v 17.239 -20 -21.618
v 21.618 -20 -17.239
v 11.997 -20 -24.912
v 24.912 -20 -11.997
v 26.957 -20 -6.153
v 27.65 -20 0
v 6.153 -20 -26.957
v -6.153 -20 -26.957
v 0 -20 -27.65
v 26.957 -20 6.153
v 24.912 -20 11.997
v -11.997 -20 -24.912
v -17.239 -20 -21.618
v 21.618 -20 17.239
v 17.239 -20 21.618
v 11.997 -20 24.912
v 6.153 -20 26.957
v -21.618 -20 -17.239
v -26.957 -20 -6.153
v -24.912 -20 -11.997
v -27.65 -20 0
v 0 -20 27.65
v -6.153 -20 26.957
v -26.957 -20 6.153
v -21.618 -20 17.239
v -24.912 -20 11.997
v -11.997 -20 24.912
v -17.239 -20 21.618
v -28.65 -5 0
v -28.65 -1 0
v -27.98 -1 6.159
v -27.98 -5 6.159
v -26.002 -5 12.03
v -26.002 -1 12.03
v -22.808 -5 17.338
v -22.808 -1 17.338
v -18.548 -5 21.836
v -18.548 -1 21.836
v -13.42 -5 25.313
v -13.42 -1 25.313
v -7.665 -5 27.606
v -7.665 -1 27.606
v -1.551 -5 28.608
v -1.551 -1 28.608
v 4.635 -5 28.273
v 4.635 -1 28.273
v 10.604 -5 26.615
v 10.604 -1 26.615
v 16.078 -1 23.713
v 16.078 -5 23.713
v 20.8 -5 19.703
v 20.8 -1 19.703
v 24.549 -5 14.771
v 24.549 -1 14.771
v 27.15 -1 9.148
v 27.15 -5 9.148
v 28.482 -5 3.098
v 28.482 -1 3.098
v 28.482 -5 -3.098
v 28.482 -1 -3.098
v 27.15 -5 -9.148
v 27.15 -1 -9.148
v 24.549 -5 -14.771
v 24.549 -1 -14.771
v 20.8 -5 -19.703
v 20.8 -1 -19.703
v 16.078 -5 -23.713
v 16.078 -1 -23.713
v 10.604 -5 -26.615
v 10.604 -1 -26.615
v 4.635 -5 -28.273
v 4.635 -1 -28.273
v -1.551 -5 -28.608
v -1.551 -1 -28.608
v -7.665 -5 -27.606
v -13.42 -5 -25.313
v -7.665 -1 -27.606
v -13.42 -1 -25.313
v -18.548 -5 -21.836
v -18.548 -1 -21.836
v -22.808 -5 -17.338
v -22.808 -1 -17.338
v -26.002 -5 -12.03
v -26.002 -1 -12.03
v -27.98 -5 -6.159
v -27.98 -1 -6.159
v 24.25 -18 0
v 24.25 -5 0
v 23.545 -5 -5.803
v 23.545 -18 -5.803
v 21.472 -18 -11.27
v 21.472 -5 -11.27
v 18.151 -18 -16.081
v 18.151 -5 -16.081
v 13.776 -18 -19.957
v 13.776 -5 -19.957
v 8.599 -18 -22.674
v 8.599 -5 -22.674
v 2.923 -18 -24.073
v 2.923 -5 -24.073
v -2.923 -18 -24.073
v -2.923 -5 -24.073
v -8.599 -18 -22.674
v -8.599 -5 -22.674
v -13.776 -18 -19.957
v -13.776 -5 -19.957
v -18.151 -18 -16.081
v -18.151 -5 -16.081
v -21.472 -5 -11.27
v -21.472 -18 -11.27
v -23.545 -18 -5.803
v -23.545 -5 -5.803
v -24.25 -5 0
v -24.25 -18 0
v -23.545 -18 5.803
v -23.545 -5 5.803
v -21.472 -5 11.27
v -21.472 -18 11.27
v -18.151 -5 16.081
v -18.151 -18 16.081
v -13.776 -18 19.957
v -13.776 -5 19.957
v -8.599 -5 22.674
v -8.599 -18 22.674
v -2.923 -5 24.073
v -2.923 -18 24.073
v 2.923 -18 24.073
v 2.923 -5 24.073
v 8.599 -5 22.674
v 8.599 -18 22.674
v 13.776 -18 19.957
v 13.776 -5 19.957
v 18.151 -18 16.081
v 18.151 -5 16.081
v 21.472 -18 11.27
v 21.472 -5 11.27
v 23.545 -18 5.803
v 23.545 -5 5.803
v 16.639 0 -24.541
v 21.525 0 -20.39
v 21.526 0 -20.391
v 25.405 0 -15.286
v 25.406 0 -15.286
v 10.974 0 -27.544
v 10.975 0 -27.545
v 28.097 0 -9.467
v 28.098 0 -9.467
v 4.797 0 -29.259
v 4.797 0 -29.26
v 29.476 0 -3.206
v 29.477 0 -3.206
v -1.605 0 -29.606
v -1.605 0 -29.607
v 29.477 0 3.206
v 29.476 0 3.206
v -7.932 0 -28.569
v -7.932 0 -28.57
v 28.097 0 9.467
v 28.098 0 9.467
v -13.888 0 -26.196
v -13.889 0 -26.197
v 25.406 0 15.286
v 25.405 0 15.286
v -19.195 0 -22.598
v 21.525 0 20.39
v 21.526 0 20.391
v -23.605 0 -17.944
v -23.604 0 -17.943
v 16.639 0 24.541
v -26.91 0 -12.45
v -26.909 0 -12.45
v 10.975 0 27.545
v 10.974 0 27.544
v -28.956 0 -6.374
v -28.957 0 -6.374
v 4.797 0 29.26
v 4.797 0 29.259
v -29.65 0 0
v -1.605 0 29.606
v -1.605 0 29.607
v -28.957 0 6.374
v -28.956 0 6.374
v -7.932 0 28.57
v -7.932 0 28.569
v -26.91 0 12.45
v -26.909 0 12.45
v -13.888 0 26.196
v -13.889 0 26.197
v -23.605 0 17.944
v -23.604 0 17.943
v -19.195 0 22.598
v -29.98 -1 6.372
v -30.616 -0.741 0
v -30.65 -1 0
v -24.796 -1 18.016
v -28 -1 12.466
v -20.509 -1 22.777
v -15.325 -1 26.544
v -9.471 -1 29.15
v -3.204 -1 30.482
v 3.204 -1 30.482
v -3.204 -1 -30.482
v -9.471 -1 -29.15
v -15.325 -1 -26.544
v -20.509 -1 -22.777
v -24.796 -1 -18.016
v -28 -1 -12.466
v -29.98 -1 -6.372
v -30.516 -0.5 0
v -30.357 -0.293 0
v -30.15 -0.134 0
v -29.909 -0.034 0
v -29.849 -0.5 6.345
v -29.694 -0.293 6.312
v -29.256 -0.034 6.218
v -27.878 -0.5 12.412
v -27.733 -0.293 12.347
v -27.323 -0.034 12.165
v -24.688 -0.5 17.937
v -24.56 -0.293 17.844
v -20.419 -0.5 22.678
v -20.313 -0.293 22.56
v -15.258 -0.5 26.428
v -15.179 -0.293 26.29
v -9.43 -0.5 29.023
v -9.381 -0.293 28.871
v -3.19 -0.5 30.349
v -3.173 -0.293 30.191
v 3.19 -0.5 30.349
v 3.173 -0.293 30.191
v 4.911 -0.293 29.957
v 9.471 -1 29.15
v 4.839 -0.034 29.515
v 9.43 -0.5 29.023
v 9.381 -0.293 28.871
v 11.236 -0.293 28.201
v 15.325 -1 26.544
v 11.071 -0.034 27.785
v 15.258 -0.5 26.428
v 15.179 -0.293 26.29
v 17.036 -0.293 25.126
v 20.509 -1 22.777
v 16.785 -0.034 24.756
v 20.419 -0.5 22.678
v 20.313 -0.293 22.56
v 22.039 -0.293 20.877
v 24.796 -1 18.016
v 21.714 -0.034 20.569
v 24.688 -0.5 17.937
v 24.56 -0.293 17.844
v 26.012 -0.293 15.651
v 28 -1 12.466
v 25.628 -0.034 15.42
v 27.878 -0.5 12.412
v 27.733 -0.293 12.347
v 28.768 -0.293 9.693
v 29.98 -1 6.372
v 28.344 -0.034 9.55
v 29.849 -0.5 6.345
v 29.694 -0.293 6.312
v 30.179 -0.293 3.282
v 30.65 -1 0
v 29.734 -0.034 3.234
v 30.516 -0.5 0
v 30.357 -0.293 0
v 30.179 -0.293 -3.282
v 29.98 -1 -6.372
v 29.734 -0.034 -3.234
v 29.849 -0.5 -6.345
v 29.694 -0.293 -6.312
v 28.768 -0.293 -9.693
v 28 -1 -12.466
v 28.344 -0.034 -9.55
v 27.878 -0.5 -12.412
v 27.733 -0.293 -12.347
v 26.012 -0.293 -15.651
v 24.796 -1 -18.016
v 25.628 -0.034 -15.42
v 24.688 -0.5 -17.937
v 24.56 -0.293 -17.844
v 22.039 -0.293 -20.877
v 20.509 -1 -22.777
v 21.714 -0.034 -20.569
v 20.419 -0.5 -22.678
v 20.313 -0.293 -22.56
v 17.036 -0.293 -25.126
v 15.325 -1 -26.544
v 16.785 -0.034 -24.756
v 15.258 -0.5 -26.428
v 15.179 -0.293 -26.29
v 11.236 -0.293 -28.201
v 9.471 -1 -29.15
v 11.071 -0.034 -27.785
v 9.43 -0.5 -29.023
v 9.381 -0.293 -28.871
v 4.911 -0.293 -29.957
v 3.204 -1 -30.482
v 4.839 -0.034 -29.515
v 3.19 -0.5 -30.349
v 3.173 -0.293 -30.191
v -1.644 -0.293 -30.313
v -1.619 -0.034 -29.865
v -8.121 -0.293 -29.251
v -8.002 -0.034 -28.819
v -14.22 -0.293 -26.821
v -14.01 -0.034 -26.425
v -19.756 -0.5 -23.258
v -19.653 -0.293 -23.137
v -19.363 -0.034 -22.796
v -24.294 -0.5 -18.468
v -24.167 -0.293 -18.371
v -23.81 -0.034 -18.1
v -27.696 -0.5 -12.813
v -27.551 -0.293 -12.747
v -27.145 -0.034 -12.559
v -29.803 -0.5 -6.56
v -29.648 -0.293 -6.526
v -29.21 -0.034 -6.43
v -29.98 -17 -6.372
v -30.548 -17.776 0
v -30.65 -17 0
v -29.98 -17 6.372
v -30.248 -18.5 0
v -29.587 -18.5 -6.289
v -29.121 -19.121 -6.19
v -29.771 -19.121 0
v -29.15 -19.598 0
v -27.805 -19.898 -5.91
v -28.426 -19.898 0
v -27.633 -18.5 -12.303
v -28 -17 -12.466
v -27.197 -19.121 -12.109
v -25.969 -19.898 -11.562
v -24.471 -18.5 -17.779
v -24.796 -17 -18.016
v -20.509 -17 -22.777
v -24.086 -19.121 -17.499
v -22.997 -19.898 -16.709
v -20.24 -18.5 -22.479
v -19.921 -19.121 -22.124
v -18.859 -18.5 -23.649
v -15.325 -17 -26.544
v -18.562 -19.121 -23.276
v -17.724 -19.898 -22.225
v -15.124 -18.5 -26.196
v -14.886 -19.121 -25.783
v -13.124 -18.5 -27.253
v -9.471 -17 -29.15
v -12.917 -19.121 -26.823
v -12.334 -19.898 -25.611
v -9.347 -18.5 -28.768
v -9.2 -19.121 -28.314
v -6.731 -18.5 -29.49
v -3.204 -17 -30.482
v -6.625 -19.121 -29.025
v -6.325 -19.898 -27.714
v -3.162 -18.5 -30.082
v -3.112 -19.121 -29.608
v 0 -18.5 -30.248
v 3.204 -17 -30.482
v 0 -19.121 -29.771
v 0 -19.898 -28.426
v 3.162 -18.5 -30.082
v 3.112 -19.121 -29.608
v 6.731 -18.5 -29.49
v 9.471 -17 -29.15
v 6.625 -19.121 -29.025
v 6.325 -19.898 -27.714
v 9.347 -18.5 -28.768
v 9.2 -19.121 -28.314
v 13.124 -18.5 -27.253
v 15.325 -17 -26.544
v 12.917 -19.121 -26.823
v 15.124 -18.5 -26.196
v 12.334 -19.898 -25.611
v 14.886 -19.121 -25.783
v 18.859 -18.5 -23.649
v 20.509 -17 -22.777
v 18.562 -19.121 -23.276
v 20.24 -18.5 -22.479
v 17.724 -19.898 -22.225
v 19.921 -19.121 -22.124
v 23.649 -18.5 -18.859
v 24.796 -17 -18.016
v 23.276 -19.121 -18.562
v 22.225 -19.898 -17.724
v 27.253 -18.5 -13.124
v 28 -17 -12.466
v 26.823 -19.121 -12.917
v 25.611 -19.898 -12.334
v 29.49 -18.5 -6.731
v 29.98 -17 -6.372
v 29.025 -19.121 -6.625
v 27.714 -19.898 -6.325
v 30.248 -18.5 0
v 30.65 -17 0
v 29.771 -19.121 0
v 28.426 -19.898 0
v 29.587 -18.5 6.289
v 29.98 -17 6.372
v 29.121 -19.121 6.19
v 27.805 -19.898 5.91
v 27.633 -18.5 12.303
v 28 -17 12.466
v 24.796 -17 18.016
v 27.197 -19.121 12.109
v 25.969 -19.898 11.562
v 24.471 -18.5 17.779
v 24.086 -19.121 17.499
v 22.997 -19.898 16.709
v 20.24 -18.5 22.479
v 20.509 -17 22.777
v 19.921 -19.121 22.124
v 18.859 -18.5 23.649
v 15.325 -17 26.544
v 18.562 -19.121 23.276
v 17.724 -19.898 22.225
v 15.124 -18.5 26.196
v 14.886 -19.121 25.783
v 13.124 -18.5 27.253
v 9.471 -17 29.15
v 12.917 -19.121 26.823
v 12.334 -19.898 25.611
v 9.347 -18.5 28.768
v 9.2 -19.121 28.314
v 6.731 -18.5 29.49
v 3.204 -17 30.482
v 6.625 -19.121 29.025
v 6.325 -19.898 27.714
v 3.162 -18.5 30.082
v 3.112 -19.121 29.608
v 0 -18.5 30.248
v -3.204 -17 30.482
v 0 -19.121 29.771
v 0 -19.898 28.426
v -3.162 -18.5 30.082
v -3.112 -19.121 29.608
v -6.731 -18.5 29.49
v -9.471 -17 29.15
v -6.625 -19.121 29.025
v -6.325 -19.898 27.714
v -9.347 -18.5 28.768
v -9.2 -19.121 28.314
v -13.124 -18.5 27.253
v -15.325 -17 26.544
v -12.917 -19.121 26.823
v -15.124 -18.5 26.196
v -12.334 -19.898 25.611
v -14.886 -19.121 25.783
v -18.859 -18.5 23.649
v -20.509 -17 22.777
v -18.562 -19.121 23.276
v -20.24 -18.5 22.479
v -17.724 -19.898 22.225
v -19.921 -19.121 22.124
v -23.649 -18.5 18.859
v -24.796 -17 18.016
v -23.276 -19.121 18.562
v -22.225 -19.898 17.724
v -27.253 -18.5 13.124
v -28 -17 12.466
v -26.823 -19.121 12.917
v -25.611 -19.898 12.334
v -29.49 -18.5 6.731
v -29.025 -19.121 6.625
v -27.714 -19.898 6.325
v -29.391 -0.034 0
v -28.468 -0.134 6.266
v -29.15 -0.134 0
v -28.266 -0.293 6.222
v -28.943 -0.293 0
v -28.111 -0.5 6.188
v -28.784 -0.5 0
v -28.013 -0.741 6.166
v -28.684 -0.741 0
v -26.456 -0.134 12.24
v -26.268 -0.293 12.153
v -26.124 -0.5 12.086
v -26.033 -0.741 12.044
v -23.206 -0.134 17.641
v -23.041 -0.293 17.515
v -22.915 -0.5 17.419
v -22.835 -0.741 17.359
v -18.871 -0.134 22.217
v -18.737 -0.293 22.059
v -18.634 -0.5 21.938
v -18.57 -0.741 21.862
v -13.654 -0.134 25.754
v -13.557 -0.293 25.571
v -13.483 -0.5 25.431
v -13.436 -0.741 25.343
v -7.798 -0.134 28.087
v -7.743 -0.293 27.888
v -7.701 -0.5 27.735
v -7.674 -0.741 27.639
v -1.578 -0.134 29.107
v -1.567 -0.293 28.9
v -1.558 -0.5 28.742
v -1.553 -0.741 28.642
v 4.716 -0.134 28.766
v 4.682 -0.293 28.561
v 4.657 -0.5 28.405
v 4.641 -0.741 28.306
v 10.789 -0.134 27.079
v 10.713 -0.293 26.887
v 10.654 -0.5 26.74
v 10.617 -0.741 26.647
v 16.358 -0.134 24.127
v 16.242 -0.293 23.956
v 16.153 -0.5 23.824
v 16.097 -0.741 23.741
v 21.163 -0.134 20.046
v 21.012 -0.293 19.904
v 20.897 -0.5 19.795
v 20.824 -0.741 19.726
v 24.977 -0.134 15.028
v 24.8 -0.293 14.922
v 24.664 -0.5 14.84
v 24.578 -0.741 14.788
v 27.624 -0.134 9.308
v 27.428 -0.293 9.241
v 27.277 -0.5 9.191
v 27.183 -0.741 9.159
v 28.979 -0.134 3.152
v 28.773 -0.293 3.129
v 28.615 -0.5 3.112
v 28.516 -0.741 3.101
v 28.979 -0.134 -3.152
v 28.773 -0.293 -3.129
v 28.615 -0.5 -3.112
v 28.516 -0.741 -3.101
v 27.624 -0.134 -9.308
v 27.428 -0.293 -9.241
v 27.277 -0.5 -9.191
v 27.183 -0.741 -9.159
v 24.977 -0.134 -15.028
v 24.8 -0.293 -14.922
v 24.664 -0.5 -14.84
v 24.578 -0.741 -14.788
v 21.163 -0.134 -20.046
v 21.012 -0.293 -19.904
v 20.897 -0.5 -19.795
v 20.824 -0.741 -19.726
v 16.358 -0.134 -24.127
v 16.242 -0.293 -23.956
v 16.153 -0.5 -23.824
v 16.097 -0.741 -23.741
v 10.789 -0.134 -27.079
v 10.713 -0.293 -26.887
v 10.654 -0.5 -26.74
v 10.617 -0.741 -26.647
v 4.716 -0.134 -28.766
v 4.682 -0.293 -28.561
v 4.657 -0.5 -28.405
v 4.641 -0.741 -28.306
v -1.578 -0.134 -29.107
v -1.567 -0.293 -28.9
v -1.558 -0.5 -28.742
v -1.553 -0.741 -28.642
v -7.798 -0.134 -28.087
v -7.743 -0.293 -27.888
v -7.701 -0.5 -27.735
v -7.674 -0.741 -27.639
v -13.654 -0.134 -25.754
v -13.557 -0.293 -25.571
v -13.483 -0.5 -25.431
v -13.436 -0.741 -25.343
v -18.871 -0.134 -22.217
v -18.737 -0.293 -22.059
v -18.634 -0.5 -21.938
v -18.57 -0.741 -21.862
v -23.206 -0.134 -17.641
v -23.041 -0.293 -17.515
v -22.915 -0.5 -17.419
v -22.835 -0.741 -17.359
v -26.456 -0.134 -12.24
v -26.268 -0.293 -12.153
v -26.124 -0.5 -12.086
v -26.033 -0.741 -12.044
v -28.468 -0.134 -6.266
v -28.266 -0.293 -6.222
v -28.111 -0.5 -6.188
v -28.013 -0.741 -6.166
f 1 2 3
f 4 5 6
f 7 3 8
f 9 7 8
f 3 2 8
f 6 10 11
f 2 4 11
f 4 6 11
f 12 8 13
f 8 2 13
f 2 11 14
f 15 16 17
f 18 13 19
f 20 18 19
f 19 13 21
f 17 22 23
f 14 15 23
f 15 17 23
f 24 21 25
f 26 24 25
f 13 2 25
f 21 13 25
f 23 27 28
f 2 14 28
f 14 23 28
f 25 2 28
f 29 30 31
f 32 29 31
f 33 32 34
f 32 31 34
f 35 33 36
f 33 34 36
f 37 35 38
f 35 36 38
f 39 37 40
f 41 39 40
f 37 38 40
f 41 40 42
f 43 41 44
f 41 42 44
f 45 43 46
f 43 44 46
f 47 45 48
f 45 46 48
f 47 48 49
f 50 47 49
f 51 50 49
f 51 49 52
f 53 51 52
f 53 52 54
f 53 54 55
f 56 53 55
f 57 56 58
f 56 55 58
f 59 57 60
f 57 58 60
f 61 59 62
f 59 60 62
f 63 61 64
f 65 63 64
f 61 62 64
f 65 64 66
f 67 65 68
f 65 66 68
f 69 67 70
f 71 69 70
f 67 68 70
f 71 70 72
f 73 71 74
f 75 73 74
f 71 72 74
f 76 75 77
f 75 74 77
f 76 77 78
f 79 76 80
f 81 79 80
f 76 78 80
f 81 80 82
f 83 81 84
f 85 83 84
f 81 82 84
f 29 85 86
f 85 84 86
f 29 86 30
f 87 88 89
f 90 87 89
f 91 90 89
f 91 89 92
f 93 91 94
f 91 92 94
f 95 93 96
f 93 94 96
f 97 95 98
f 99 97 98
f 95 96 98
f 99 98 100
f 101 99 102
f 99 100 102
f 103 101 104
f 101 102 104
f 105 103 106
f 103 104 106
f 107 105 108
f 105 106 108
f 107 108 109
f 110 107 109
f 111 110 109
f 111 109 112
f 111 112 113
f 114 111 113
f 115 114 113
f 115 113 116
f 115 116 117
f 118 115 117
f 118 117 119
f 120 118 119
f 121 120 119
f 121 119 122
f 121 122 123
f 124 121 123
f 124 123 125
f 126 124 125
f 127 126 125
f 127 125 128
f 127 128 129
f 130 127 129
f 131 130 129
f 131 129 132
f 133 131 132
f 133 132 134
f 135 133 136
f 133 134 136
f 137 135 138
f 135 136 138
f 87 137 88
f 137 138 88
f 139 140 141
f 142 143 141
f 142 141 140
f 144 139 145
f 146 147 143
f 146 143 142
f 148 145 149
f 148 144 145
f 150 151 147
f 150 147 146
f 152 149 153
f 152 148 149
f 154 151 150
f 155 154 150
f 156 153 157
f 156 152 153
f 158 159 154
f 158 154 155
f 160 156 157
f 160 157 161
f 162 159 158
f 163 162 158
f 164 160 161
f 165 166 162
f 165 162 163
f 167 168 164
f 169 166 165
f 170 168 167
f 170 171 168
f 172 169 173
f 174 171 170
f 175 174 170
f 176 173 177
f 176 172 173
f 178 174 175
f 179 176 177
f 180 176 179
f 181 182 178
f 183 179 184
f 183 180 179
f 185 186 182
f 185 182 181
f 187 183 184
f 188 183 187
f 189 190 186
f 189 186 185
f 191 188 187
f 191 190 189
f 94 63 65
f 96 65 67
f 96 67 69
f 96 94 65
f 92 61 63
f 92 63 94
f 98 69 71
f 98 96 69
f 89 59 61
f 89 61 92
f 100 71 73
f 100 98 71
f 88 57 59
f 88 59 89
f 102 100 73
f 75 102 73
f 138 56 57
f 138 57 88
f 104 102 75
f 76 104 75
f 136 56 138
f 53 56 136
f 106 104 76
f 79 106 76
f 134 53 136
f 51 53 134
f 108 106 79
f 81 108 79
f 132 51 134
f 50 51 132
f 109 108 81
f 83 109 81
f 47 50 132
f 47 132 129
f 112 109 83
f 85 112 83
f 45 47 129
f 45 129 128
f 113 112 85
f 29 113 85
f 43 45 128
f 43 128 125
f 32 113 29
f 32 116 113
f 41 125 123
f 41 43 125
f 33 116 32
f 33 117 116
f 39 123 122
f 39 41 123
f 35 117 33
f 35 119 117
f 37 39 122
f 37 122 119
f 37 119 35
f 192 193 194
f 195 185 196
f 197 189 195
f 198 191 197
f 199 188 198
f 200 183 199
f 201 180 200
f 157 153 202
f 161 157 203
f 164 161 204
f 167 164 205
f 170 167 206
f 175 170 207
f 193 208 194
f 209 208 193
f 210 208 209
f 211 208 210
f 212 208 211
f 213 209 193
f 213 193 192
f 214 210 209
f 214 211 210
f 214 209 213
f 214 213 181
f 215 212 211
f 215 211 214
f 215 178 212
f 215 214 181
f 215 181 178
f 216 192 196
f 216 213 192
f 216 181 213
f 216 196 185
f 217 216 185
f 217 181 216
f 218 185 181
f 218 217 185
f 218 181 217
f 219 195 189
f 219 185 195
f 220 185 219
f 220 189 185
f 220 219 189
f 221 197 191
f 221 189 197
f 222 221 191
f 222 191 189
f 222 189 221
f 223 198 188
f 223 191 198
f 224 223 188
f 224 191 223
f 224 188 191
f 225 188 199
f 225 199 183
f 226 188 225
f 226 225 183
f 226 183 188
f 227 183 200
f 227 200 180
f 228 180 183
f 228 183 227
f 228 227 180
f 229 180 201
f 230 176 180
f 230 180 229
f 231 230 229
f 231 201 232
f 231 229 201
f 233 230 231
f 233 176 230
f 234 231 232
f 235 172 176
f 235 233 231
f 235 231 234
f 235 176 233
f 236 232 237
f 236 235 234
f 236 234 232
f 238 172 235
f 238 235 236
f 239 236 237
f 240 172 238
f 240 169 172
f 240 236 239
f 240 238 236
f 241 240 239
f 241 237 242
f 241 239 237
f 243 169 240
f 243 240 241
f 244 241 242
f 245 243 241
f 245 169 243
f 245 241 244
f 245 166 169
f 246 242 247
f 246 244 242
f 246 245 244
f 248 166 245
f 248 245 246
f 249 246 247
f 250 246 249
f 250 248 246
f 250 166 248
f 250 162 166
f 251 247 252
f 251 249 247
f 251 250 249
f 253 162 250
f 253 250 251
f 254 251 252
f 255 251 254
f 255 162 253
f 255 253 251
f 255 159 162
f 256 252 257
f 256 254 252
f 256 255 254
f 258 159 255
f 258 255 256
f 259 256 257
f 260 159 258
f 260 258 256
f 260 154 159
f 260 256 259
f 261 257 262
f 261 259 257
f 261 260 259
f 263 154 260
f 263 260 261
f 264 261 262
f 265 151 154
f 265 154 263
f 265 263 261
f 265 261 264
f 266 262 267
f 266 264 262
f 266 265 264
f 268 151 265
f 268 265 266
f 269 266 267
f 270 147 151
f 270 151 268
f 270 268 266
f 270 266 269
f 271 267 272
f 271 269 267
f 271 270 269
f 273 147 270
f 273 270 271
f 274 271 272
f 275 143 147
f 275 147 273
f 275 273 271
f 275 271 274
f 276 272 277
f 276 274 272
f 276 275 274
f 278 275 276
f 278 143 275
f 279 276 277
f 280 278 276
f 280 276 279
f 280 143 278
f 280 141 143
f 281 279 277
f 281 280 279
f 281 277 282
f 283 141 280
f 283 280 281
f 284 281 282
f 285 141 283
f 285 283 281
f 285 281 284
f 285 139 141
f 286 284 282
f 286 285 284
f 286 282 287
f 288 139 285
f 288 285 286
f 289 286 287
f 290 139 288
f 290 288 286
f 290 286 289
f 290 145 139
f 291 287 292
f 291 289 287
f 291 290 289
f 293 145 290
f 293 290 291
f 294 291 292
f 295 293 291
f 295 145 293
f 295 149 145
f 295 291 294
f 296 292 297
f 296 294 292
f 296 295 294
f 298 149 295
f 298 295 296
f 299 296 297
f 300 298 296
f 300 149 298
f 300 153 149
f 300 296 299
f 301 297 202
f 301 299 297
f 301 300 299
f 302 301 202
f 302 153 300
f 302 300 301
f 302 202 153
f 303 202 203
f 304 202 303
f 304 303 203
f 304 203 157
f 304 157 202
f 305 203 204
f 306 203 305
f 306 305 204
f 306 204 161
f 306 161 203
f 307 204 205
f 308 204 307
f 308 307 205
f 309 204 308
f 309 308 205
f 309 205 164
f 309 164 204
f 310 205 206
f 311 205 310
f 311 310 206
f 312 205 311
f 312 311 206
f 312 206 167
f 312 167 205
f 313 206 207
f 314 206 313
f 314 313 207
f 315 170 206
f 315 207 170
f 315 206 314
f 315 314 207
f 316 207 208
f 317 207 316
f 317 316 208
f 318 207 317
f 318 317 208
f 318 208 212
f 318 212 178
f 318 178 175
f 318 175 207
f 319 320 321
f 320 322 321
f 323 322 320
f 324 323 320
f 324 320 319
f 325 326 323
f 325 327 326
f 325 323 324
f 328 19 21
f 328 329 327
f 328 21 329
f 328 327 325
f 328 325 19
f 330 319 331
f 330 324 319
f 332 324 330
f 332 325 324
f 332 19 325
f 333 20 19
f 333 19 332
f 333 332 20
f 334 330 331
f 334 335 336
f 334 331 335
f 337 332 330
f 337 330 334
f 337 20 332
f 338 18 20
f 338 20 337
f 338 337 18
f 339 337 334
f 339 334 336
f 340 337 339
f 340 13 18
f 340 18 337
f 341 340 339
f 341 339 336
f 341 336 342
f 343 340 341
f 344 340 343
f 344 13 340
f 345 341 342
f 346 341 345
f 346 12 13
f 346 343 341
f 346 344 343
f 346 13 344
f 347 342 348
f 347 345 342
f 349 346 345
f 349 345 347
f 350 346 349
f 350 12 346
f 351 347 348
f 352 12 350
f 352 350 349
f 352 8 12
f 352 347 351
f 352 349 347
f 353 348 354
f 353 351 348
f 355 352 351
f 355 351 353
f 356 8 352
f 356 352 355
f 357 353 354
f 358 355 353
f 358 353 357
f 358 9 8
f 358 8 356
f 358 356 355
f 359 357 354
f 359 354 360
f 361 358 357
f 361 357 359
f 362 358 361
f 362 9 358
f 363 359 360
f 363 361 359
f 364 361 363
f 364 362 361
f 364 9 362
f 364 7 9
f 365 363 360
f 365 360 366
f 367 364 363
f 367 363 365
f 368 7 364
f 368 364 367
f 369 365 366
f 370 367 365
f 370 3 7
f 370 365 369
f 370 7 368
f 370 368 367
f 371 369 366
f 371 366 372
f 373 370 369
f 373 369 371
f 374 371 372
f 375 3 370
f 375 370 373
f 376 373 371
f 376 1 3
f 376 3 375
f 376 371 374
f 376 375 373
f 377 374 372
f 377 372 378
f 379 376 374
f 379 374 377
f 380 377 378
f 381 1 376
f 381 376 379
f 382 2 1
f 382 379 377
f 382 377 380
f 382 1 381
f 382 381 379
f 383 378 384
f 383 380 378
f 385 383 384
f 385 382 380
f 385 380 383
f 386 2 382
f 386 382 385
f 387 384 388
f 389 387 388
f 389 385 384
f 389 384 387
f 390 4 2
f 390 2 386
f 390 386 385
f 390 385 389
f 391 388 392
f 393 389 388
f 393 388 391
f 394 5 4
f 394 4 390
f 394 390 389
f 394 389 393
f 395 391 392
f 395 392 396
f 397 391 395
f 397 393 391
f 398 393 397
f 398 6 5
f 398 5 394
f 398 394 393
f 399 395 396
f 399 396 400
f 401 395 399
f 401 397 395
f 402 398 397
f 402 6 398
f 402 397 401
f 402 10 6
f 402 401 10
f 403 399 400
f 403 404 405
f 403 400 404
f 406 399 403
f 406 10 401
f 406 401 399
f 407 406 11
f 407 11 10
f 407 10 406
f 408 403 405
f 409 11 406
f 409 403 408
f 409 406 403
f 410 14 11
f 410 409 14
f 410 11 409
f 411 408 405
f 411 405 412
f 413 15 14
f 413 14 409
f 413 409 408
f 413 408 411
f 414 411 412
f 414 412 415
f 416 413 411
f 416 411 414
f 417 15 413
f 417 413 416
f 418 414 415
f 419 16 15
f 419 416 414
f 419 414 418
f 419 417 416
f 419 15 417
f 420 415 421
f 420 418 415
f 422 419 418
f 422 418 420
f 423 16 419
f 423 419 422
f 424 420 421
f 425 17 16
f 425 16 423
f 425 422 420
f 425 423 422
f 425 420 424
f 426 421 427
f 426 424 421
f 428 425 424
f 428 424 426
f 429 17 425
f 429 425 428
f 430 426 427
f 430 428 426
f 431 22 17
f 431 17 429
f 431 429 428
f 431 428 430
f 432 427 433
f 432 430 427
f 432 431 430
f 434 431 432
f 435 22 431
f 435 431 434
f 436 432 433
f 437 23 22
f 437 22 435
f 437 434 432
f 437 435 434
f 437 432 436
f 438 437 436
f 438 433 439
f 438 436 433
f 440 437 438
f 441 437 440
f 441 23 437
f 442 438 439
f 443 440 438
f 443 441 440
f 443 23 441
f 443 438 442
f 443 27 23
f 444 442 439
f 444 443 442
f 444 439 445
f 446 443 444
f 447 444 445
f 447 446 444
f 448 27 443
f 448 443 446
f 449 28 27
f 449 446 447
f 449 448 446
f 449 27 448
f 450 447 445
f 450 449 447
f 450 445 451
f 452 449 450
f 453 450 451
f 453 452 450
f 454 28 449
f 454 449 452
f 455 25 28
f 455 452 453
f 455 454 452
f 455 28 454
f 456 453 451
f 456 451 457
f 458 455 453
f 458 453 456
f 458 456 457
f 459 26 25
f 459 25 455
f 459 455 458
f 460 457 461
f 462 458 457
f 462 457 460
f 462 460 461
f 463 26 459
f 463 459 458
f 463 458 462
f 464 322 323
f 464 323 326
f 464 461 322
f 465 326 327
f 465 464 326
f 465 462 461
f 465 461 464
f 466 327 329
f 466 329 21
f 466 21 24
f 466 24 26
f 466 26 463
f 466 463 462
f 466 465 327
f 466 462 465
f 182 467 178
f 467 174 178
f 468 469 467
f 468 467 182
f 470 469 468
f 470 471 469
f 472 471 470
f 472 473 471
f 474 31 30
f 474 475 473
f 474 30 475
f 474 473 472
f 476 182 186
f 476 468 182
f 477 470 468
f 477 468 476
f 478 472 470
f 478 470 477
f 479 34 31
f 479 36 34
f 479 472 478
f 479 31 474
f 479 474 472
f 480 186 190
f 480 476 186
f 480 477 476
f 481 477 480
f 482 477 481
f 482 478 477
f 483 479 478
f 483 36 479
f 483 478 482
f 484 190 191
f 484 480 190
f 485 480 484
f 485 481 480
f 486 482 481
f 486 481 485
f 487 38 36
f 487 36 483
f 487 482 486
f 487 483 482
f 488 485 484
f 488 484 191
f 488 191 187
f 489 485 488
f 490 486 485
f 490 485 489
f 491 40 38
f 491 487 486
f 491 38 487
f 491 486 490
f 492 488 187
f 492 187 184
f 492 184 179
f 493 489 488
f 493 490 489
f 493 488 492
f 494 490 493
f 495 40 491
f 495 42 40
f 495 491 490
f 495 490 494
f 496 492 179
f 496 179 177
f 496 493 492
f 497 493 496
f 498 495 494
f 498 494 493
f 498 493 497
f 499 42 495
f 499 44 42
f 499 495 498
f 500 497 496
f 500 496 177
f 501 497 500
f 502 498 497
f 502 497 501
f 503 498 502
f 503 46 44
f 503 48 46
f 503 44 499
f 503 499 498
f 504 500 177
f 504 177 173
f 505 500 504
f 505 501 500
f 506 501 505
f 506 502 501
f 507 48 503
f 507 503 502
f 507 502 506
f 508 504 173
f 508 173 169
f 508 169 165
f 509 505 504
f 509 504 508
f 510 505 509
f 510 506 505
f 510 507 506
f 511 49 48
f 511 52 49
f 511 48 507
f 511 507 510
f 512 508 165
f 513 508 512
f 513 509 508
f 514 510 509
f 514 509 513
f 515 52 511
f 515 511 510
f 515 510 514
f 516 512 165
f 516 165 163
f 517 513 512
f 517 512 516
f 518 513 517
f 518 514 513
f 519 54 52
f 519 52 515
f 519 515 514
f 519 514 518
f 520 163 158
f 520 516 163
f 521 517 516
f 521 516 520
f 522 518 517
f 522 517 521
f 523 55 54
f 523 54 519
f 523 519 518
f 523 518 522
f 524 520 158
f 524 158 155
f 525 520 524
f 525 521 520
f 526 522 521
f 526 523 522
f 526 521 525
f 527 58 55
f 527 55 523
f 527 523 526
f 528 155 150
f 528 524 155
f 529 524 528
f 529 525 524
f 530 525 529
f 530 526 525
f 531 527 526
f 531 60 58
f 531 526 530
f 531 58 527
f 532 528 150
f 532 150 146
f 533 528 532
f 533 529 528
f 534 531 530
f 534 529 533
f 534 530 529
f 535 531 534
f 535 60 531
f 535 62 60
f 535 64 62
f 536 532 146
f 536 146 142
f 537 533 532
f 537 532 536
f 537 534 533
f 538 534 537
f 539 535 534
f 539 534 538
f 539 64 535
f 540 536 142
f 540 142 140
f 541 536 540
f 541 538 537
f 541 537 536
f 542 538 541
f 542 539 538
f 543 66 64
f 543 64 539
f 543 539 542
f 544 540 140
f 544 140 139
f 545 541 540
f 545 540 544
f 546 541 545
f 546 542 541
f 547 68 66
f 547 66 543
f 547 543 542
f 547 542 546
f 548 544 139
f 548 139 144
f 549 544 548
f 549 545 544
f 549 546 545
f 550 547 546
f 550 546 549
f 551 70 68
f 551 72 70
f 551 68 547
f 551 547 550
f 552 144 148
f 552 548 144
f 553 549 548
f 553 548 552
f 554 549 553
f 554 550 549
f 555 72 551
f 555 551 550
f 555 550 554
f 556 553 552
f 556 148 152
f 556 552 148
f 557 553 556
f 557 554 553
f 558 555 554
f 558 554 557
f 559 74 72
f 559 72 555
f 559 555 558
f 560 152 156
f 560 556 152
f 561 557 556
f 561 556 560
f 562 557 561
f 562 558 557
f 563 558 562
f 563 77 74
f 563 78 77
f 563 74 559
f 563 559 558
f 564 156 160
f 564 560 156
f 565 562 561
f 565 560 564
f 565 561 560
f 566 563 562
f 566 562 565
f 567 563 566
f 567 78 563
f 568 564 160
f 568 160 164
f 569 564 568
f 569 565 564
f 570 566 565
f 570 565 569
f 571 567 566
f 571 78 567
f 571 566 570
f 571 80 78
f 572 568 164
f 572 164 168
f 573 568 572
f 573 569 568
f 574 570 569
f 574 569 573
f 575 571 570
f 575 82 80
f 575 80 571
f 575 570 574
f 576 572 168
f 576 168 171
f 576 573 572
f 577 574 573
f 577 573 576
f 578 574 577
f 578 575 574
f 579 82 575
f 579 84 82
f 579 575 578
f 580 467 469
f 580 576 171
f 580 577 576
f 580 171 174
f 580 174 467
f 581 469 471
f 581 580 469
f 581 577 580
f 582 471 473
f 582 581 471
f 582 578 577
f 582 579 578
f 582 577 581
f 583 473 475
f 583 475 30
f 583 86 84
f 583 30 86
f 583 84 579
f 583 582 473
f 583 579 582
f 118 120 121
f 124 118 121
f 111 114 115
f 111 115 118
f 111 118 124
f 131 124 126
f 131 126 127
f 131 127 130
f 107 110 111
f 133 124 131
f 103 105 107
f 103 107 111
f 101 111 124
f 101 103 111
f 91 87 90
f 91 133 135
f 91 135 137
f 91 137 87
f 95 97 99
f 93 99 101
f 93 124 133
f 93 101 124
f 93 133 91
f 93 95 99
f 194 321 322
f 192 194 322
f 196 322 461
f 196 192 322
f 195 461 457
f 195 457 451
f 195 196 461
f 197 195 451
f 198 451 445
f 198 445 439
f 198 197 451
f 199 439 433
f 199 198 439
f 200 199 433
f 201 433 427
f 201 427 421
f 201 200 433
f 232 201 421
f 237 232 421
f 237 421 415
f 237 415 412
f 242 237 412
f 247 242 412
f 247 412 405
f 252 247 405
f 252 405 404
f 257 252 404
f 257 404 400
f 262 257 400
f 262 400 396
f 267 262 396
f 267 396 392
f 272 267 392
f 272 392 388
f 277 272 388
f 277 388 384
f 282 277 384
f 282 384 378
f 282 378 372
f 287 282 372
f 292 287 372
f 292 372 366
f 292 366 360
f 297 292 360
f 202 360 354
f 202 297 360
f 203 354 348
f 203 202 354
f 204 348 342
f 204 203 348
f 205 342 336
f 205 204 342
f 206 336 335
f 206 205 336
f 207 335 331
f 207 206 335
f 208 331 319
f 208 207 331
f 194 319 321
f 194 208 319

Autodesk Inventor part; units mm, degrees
ref_plane "YZ Plane" through (0, 0, 0) normal (1, 0, 0) x (0, 1, 0)
ref_plane "XZ Plane" through (0, 0, 0) normal (0, 1, 0) x (-1, 0, 0)
ref_plane "XY Plane" through (0, 0, 0) normal (0, 0, 1) x (1, 0, 0)
sketch "草圖1" plane through (0, 0, 0) normal (0, 1, 0) x (-1, 0, 0)
  circle A0 centre (0, 0) radius 28.65
  circle A1 centre (0, 0) radius 30.65
  dimension "d0" = 57.3
  dimension "d1" = 2
extrude "擠出1" add sketch "草圖1" against normal blind 20 contours A0 | A1
extrude "擠出2" cut sketch "草圖1" against normal blind 5 contours A0
sketch "草圖3" plane through (0, -5, 0) normal (0, 1, 0) x (1, 0, 0)
  circle A0 centre (0, 0) radius 28.65 projected
  circle A1 centre (0, 0) radius 30.65 projected
  circle A2 centre (0, 0) radius 24.25
  dimension "d7" = 4.4
extrude "擠出3" cut sketch "草圖3" against normal blind 13 contours A2
fillet "圓角1" radius 3 1 edges at (30.65, -20, 0)
fillet "圓角2" radius 1 2 edges at (28.65, 0, 0) (30.65, 0, 0)
properties part number "super flash light v4_3D 列印"
